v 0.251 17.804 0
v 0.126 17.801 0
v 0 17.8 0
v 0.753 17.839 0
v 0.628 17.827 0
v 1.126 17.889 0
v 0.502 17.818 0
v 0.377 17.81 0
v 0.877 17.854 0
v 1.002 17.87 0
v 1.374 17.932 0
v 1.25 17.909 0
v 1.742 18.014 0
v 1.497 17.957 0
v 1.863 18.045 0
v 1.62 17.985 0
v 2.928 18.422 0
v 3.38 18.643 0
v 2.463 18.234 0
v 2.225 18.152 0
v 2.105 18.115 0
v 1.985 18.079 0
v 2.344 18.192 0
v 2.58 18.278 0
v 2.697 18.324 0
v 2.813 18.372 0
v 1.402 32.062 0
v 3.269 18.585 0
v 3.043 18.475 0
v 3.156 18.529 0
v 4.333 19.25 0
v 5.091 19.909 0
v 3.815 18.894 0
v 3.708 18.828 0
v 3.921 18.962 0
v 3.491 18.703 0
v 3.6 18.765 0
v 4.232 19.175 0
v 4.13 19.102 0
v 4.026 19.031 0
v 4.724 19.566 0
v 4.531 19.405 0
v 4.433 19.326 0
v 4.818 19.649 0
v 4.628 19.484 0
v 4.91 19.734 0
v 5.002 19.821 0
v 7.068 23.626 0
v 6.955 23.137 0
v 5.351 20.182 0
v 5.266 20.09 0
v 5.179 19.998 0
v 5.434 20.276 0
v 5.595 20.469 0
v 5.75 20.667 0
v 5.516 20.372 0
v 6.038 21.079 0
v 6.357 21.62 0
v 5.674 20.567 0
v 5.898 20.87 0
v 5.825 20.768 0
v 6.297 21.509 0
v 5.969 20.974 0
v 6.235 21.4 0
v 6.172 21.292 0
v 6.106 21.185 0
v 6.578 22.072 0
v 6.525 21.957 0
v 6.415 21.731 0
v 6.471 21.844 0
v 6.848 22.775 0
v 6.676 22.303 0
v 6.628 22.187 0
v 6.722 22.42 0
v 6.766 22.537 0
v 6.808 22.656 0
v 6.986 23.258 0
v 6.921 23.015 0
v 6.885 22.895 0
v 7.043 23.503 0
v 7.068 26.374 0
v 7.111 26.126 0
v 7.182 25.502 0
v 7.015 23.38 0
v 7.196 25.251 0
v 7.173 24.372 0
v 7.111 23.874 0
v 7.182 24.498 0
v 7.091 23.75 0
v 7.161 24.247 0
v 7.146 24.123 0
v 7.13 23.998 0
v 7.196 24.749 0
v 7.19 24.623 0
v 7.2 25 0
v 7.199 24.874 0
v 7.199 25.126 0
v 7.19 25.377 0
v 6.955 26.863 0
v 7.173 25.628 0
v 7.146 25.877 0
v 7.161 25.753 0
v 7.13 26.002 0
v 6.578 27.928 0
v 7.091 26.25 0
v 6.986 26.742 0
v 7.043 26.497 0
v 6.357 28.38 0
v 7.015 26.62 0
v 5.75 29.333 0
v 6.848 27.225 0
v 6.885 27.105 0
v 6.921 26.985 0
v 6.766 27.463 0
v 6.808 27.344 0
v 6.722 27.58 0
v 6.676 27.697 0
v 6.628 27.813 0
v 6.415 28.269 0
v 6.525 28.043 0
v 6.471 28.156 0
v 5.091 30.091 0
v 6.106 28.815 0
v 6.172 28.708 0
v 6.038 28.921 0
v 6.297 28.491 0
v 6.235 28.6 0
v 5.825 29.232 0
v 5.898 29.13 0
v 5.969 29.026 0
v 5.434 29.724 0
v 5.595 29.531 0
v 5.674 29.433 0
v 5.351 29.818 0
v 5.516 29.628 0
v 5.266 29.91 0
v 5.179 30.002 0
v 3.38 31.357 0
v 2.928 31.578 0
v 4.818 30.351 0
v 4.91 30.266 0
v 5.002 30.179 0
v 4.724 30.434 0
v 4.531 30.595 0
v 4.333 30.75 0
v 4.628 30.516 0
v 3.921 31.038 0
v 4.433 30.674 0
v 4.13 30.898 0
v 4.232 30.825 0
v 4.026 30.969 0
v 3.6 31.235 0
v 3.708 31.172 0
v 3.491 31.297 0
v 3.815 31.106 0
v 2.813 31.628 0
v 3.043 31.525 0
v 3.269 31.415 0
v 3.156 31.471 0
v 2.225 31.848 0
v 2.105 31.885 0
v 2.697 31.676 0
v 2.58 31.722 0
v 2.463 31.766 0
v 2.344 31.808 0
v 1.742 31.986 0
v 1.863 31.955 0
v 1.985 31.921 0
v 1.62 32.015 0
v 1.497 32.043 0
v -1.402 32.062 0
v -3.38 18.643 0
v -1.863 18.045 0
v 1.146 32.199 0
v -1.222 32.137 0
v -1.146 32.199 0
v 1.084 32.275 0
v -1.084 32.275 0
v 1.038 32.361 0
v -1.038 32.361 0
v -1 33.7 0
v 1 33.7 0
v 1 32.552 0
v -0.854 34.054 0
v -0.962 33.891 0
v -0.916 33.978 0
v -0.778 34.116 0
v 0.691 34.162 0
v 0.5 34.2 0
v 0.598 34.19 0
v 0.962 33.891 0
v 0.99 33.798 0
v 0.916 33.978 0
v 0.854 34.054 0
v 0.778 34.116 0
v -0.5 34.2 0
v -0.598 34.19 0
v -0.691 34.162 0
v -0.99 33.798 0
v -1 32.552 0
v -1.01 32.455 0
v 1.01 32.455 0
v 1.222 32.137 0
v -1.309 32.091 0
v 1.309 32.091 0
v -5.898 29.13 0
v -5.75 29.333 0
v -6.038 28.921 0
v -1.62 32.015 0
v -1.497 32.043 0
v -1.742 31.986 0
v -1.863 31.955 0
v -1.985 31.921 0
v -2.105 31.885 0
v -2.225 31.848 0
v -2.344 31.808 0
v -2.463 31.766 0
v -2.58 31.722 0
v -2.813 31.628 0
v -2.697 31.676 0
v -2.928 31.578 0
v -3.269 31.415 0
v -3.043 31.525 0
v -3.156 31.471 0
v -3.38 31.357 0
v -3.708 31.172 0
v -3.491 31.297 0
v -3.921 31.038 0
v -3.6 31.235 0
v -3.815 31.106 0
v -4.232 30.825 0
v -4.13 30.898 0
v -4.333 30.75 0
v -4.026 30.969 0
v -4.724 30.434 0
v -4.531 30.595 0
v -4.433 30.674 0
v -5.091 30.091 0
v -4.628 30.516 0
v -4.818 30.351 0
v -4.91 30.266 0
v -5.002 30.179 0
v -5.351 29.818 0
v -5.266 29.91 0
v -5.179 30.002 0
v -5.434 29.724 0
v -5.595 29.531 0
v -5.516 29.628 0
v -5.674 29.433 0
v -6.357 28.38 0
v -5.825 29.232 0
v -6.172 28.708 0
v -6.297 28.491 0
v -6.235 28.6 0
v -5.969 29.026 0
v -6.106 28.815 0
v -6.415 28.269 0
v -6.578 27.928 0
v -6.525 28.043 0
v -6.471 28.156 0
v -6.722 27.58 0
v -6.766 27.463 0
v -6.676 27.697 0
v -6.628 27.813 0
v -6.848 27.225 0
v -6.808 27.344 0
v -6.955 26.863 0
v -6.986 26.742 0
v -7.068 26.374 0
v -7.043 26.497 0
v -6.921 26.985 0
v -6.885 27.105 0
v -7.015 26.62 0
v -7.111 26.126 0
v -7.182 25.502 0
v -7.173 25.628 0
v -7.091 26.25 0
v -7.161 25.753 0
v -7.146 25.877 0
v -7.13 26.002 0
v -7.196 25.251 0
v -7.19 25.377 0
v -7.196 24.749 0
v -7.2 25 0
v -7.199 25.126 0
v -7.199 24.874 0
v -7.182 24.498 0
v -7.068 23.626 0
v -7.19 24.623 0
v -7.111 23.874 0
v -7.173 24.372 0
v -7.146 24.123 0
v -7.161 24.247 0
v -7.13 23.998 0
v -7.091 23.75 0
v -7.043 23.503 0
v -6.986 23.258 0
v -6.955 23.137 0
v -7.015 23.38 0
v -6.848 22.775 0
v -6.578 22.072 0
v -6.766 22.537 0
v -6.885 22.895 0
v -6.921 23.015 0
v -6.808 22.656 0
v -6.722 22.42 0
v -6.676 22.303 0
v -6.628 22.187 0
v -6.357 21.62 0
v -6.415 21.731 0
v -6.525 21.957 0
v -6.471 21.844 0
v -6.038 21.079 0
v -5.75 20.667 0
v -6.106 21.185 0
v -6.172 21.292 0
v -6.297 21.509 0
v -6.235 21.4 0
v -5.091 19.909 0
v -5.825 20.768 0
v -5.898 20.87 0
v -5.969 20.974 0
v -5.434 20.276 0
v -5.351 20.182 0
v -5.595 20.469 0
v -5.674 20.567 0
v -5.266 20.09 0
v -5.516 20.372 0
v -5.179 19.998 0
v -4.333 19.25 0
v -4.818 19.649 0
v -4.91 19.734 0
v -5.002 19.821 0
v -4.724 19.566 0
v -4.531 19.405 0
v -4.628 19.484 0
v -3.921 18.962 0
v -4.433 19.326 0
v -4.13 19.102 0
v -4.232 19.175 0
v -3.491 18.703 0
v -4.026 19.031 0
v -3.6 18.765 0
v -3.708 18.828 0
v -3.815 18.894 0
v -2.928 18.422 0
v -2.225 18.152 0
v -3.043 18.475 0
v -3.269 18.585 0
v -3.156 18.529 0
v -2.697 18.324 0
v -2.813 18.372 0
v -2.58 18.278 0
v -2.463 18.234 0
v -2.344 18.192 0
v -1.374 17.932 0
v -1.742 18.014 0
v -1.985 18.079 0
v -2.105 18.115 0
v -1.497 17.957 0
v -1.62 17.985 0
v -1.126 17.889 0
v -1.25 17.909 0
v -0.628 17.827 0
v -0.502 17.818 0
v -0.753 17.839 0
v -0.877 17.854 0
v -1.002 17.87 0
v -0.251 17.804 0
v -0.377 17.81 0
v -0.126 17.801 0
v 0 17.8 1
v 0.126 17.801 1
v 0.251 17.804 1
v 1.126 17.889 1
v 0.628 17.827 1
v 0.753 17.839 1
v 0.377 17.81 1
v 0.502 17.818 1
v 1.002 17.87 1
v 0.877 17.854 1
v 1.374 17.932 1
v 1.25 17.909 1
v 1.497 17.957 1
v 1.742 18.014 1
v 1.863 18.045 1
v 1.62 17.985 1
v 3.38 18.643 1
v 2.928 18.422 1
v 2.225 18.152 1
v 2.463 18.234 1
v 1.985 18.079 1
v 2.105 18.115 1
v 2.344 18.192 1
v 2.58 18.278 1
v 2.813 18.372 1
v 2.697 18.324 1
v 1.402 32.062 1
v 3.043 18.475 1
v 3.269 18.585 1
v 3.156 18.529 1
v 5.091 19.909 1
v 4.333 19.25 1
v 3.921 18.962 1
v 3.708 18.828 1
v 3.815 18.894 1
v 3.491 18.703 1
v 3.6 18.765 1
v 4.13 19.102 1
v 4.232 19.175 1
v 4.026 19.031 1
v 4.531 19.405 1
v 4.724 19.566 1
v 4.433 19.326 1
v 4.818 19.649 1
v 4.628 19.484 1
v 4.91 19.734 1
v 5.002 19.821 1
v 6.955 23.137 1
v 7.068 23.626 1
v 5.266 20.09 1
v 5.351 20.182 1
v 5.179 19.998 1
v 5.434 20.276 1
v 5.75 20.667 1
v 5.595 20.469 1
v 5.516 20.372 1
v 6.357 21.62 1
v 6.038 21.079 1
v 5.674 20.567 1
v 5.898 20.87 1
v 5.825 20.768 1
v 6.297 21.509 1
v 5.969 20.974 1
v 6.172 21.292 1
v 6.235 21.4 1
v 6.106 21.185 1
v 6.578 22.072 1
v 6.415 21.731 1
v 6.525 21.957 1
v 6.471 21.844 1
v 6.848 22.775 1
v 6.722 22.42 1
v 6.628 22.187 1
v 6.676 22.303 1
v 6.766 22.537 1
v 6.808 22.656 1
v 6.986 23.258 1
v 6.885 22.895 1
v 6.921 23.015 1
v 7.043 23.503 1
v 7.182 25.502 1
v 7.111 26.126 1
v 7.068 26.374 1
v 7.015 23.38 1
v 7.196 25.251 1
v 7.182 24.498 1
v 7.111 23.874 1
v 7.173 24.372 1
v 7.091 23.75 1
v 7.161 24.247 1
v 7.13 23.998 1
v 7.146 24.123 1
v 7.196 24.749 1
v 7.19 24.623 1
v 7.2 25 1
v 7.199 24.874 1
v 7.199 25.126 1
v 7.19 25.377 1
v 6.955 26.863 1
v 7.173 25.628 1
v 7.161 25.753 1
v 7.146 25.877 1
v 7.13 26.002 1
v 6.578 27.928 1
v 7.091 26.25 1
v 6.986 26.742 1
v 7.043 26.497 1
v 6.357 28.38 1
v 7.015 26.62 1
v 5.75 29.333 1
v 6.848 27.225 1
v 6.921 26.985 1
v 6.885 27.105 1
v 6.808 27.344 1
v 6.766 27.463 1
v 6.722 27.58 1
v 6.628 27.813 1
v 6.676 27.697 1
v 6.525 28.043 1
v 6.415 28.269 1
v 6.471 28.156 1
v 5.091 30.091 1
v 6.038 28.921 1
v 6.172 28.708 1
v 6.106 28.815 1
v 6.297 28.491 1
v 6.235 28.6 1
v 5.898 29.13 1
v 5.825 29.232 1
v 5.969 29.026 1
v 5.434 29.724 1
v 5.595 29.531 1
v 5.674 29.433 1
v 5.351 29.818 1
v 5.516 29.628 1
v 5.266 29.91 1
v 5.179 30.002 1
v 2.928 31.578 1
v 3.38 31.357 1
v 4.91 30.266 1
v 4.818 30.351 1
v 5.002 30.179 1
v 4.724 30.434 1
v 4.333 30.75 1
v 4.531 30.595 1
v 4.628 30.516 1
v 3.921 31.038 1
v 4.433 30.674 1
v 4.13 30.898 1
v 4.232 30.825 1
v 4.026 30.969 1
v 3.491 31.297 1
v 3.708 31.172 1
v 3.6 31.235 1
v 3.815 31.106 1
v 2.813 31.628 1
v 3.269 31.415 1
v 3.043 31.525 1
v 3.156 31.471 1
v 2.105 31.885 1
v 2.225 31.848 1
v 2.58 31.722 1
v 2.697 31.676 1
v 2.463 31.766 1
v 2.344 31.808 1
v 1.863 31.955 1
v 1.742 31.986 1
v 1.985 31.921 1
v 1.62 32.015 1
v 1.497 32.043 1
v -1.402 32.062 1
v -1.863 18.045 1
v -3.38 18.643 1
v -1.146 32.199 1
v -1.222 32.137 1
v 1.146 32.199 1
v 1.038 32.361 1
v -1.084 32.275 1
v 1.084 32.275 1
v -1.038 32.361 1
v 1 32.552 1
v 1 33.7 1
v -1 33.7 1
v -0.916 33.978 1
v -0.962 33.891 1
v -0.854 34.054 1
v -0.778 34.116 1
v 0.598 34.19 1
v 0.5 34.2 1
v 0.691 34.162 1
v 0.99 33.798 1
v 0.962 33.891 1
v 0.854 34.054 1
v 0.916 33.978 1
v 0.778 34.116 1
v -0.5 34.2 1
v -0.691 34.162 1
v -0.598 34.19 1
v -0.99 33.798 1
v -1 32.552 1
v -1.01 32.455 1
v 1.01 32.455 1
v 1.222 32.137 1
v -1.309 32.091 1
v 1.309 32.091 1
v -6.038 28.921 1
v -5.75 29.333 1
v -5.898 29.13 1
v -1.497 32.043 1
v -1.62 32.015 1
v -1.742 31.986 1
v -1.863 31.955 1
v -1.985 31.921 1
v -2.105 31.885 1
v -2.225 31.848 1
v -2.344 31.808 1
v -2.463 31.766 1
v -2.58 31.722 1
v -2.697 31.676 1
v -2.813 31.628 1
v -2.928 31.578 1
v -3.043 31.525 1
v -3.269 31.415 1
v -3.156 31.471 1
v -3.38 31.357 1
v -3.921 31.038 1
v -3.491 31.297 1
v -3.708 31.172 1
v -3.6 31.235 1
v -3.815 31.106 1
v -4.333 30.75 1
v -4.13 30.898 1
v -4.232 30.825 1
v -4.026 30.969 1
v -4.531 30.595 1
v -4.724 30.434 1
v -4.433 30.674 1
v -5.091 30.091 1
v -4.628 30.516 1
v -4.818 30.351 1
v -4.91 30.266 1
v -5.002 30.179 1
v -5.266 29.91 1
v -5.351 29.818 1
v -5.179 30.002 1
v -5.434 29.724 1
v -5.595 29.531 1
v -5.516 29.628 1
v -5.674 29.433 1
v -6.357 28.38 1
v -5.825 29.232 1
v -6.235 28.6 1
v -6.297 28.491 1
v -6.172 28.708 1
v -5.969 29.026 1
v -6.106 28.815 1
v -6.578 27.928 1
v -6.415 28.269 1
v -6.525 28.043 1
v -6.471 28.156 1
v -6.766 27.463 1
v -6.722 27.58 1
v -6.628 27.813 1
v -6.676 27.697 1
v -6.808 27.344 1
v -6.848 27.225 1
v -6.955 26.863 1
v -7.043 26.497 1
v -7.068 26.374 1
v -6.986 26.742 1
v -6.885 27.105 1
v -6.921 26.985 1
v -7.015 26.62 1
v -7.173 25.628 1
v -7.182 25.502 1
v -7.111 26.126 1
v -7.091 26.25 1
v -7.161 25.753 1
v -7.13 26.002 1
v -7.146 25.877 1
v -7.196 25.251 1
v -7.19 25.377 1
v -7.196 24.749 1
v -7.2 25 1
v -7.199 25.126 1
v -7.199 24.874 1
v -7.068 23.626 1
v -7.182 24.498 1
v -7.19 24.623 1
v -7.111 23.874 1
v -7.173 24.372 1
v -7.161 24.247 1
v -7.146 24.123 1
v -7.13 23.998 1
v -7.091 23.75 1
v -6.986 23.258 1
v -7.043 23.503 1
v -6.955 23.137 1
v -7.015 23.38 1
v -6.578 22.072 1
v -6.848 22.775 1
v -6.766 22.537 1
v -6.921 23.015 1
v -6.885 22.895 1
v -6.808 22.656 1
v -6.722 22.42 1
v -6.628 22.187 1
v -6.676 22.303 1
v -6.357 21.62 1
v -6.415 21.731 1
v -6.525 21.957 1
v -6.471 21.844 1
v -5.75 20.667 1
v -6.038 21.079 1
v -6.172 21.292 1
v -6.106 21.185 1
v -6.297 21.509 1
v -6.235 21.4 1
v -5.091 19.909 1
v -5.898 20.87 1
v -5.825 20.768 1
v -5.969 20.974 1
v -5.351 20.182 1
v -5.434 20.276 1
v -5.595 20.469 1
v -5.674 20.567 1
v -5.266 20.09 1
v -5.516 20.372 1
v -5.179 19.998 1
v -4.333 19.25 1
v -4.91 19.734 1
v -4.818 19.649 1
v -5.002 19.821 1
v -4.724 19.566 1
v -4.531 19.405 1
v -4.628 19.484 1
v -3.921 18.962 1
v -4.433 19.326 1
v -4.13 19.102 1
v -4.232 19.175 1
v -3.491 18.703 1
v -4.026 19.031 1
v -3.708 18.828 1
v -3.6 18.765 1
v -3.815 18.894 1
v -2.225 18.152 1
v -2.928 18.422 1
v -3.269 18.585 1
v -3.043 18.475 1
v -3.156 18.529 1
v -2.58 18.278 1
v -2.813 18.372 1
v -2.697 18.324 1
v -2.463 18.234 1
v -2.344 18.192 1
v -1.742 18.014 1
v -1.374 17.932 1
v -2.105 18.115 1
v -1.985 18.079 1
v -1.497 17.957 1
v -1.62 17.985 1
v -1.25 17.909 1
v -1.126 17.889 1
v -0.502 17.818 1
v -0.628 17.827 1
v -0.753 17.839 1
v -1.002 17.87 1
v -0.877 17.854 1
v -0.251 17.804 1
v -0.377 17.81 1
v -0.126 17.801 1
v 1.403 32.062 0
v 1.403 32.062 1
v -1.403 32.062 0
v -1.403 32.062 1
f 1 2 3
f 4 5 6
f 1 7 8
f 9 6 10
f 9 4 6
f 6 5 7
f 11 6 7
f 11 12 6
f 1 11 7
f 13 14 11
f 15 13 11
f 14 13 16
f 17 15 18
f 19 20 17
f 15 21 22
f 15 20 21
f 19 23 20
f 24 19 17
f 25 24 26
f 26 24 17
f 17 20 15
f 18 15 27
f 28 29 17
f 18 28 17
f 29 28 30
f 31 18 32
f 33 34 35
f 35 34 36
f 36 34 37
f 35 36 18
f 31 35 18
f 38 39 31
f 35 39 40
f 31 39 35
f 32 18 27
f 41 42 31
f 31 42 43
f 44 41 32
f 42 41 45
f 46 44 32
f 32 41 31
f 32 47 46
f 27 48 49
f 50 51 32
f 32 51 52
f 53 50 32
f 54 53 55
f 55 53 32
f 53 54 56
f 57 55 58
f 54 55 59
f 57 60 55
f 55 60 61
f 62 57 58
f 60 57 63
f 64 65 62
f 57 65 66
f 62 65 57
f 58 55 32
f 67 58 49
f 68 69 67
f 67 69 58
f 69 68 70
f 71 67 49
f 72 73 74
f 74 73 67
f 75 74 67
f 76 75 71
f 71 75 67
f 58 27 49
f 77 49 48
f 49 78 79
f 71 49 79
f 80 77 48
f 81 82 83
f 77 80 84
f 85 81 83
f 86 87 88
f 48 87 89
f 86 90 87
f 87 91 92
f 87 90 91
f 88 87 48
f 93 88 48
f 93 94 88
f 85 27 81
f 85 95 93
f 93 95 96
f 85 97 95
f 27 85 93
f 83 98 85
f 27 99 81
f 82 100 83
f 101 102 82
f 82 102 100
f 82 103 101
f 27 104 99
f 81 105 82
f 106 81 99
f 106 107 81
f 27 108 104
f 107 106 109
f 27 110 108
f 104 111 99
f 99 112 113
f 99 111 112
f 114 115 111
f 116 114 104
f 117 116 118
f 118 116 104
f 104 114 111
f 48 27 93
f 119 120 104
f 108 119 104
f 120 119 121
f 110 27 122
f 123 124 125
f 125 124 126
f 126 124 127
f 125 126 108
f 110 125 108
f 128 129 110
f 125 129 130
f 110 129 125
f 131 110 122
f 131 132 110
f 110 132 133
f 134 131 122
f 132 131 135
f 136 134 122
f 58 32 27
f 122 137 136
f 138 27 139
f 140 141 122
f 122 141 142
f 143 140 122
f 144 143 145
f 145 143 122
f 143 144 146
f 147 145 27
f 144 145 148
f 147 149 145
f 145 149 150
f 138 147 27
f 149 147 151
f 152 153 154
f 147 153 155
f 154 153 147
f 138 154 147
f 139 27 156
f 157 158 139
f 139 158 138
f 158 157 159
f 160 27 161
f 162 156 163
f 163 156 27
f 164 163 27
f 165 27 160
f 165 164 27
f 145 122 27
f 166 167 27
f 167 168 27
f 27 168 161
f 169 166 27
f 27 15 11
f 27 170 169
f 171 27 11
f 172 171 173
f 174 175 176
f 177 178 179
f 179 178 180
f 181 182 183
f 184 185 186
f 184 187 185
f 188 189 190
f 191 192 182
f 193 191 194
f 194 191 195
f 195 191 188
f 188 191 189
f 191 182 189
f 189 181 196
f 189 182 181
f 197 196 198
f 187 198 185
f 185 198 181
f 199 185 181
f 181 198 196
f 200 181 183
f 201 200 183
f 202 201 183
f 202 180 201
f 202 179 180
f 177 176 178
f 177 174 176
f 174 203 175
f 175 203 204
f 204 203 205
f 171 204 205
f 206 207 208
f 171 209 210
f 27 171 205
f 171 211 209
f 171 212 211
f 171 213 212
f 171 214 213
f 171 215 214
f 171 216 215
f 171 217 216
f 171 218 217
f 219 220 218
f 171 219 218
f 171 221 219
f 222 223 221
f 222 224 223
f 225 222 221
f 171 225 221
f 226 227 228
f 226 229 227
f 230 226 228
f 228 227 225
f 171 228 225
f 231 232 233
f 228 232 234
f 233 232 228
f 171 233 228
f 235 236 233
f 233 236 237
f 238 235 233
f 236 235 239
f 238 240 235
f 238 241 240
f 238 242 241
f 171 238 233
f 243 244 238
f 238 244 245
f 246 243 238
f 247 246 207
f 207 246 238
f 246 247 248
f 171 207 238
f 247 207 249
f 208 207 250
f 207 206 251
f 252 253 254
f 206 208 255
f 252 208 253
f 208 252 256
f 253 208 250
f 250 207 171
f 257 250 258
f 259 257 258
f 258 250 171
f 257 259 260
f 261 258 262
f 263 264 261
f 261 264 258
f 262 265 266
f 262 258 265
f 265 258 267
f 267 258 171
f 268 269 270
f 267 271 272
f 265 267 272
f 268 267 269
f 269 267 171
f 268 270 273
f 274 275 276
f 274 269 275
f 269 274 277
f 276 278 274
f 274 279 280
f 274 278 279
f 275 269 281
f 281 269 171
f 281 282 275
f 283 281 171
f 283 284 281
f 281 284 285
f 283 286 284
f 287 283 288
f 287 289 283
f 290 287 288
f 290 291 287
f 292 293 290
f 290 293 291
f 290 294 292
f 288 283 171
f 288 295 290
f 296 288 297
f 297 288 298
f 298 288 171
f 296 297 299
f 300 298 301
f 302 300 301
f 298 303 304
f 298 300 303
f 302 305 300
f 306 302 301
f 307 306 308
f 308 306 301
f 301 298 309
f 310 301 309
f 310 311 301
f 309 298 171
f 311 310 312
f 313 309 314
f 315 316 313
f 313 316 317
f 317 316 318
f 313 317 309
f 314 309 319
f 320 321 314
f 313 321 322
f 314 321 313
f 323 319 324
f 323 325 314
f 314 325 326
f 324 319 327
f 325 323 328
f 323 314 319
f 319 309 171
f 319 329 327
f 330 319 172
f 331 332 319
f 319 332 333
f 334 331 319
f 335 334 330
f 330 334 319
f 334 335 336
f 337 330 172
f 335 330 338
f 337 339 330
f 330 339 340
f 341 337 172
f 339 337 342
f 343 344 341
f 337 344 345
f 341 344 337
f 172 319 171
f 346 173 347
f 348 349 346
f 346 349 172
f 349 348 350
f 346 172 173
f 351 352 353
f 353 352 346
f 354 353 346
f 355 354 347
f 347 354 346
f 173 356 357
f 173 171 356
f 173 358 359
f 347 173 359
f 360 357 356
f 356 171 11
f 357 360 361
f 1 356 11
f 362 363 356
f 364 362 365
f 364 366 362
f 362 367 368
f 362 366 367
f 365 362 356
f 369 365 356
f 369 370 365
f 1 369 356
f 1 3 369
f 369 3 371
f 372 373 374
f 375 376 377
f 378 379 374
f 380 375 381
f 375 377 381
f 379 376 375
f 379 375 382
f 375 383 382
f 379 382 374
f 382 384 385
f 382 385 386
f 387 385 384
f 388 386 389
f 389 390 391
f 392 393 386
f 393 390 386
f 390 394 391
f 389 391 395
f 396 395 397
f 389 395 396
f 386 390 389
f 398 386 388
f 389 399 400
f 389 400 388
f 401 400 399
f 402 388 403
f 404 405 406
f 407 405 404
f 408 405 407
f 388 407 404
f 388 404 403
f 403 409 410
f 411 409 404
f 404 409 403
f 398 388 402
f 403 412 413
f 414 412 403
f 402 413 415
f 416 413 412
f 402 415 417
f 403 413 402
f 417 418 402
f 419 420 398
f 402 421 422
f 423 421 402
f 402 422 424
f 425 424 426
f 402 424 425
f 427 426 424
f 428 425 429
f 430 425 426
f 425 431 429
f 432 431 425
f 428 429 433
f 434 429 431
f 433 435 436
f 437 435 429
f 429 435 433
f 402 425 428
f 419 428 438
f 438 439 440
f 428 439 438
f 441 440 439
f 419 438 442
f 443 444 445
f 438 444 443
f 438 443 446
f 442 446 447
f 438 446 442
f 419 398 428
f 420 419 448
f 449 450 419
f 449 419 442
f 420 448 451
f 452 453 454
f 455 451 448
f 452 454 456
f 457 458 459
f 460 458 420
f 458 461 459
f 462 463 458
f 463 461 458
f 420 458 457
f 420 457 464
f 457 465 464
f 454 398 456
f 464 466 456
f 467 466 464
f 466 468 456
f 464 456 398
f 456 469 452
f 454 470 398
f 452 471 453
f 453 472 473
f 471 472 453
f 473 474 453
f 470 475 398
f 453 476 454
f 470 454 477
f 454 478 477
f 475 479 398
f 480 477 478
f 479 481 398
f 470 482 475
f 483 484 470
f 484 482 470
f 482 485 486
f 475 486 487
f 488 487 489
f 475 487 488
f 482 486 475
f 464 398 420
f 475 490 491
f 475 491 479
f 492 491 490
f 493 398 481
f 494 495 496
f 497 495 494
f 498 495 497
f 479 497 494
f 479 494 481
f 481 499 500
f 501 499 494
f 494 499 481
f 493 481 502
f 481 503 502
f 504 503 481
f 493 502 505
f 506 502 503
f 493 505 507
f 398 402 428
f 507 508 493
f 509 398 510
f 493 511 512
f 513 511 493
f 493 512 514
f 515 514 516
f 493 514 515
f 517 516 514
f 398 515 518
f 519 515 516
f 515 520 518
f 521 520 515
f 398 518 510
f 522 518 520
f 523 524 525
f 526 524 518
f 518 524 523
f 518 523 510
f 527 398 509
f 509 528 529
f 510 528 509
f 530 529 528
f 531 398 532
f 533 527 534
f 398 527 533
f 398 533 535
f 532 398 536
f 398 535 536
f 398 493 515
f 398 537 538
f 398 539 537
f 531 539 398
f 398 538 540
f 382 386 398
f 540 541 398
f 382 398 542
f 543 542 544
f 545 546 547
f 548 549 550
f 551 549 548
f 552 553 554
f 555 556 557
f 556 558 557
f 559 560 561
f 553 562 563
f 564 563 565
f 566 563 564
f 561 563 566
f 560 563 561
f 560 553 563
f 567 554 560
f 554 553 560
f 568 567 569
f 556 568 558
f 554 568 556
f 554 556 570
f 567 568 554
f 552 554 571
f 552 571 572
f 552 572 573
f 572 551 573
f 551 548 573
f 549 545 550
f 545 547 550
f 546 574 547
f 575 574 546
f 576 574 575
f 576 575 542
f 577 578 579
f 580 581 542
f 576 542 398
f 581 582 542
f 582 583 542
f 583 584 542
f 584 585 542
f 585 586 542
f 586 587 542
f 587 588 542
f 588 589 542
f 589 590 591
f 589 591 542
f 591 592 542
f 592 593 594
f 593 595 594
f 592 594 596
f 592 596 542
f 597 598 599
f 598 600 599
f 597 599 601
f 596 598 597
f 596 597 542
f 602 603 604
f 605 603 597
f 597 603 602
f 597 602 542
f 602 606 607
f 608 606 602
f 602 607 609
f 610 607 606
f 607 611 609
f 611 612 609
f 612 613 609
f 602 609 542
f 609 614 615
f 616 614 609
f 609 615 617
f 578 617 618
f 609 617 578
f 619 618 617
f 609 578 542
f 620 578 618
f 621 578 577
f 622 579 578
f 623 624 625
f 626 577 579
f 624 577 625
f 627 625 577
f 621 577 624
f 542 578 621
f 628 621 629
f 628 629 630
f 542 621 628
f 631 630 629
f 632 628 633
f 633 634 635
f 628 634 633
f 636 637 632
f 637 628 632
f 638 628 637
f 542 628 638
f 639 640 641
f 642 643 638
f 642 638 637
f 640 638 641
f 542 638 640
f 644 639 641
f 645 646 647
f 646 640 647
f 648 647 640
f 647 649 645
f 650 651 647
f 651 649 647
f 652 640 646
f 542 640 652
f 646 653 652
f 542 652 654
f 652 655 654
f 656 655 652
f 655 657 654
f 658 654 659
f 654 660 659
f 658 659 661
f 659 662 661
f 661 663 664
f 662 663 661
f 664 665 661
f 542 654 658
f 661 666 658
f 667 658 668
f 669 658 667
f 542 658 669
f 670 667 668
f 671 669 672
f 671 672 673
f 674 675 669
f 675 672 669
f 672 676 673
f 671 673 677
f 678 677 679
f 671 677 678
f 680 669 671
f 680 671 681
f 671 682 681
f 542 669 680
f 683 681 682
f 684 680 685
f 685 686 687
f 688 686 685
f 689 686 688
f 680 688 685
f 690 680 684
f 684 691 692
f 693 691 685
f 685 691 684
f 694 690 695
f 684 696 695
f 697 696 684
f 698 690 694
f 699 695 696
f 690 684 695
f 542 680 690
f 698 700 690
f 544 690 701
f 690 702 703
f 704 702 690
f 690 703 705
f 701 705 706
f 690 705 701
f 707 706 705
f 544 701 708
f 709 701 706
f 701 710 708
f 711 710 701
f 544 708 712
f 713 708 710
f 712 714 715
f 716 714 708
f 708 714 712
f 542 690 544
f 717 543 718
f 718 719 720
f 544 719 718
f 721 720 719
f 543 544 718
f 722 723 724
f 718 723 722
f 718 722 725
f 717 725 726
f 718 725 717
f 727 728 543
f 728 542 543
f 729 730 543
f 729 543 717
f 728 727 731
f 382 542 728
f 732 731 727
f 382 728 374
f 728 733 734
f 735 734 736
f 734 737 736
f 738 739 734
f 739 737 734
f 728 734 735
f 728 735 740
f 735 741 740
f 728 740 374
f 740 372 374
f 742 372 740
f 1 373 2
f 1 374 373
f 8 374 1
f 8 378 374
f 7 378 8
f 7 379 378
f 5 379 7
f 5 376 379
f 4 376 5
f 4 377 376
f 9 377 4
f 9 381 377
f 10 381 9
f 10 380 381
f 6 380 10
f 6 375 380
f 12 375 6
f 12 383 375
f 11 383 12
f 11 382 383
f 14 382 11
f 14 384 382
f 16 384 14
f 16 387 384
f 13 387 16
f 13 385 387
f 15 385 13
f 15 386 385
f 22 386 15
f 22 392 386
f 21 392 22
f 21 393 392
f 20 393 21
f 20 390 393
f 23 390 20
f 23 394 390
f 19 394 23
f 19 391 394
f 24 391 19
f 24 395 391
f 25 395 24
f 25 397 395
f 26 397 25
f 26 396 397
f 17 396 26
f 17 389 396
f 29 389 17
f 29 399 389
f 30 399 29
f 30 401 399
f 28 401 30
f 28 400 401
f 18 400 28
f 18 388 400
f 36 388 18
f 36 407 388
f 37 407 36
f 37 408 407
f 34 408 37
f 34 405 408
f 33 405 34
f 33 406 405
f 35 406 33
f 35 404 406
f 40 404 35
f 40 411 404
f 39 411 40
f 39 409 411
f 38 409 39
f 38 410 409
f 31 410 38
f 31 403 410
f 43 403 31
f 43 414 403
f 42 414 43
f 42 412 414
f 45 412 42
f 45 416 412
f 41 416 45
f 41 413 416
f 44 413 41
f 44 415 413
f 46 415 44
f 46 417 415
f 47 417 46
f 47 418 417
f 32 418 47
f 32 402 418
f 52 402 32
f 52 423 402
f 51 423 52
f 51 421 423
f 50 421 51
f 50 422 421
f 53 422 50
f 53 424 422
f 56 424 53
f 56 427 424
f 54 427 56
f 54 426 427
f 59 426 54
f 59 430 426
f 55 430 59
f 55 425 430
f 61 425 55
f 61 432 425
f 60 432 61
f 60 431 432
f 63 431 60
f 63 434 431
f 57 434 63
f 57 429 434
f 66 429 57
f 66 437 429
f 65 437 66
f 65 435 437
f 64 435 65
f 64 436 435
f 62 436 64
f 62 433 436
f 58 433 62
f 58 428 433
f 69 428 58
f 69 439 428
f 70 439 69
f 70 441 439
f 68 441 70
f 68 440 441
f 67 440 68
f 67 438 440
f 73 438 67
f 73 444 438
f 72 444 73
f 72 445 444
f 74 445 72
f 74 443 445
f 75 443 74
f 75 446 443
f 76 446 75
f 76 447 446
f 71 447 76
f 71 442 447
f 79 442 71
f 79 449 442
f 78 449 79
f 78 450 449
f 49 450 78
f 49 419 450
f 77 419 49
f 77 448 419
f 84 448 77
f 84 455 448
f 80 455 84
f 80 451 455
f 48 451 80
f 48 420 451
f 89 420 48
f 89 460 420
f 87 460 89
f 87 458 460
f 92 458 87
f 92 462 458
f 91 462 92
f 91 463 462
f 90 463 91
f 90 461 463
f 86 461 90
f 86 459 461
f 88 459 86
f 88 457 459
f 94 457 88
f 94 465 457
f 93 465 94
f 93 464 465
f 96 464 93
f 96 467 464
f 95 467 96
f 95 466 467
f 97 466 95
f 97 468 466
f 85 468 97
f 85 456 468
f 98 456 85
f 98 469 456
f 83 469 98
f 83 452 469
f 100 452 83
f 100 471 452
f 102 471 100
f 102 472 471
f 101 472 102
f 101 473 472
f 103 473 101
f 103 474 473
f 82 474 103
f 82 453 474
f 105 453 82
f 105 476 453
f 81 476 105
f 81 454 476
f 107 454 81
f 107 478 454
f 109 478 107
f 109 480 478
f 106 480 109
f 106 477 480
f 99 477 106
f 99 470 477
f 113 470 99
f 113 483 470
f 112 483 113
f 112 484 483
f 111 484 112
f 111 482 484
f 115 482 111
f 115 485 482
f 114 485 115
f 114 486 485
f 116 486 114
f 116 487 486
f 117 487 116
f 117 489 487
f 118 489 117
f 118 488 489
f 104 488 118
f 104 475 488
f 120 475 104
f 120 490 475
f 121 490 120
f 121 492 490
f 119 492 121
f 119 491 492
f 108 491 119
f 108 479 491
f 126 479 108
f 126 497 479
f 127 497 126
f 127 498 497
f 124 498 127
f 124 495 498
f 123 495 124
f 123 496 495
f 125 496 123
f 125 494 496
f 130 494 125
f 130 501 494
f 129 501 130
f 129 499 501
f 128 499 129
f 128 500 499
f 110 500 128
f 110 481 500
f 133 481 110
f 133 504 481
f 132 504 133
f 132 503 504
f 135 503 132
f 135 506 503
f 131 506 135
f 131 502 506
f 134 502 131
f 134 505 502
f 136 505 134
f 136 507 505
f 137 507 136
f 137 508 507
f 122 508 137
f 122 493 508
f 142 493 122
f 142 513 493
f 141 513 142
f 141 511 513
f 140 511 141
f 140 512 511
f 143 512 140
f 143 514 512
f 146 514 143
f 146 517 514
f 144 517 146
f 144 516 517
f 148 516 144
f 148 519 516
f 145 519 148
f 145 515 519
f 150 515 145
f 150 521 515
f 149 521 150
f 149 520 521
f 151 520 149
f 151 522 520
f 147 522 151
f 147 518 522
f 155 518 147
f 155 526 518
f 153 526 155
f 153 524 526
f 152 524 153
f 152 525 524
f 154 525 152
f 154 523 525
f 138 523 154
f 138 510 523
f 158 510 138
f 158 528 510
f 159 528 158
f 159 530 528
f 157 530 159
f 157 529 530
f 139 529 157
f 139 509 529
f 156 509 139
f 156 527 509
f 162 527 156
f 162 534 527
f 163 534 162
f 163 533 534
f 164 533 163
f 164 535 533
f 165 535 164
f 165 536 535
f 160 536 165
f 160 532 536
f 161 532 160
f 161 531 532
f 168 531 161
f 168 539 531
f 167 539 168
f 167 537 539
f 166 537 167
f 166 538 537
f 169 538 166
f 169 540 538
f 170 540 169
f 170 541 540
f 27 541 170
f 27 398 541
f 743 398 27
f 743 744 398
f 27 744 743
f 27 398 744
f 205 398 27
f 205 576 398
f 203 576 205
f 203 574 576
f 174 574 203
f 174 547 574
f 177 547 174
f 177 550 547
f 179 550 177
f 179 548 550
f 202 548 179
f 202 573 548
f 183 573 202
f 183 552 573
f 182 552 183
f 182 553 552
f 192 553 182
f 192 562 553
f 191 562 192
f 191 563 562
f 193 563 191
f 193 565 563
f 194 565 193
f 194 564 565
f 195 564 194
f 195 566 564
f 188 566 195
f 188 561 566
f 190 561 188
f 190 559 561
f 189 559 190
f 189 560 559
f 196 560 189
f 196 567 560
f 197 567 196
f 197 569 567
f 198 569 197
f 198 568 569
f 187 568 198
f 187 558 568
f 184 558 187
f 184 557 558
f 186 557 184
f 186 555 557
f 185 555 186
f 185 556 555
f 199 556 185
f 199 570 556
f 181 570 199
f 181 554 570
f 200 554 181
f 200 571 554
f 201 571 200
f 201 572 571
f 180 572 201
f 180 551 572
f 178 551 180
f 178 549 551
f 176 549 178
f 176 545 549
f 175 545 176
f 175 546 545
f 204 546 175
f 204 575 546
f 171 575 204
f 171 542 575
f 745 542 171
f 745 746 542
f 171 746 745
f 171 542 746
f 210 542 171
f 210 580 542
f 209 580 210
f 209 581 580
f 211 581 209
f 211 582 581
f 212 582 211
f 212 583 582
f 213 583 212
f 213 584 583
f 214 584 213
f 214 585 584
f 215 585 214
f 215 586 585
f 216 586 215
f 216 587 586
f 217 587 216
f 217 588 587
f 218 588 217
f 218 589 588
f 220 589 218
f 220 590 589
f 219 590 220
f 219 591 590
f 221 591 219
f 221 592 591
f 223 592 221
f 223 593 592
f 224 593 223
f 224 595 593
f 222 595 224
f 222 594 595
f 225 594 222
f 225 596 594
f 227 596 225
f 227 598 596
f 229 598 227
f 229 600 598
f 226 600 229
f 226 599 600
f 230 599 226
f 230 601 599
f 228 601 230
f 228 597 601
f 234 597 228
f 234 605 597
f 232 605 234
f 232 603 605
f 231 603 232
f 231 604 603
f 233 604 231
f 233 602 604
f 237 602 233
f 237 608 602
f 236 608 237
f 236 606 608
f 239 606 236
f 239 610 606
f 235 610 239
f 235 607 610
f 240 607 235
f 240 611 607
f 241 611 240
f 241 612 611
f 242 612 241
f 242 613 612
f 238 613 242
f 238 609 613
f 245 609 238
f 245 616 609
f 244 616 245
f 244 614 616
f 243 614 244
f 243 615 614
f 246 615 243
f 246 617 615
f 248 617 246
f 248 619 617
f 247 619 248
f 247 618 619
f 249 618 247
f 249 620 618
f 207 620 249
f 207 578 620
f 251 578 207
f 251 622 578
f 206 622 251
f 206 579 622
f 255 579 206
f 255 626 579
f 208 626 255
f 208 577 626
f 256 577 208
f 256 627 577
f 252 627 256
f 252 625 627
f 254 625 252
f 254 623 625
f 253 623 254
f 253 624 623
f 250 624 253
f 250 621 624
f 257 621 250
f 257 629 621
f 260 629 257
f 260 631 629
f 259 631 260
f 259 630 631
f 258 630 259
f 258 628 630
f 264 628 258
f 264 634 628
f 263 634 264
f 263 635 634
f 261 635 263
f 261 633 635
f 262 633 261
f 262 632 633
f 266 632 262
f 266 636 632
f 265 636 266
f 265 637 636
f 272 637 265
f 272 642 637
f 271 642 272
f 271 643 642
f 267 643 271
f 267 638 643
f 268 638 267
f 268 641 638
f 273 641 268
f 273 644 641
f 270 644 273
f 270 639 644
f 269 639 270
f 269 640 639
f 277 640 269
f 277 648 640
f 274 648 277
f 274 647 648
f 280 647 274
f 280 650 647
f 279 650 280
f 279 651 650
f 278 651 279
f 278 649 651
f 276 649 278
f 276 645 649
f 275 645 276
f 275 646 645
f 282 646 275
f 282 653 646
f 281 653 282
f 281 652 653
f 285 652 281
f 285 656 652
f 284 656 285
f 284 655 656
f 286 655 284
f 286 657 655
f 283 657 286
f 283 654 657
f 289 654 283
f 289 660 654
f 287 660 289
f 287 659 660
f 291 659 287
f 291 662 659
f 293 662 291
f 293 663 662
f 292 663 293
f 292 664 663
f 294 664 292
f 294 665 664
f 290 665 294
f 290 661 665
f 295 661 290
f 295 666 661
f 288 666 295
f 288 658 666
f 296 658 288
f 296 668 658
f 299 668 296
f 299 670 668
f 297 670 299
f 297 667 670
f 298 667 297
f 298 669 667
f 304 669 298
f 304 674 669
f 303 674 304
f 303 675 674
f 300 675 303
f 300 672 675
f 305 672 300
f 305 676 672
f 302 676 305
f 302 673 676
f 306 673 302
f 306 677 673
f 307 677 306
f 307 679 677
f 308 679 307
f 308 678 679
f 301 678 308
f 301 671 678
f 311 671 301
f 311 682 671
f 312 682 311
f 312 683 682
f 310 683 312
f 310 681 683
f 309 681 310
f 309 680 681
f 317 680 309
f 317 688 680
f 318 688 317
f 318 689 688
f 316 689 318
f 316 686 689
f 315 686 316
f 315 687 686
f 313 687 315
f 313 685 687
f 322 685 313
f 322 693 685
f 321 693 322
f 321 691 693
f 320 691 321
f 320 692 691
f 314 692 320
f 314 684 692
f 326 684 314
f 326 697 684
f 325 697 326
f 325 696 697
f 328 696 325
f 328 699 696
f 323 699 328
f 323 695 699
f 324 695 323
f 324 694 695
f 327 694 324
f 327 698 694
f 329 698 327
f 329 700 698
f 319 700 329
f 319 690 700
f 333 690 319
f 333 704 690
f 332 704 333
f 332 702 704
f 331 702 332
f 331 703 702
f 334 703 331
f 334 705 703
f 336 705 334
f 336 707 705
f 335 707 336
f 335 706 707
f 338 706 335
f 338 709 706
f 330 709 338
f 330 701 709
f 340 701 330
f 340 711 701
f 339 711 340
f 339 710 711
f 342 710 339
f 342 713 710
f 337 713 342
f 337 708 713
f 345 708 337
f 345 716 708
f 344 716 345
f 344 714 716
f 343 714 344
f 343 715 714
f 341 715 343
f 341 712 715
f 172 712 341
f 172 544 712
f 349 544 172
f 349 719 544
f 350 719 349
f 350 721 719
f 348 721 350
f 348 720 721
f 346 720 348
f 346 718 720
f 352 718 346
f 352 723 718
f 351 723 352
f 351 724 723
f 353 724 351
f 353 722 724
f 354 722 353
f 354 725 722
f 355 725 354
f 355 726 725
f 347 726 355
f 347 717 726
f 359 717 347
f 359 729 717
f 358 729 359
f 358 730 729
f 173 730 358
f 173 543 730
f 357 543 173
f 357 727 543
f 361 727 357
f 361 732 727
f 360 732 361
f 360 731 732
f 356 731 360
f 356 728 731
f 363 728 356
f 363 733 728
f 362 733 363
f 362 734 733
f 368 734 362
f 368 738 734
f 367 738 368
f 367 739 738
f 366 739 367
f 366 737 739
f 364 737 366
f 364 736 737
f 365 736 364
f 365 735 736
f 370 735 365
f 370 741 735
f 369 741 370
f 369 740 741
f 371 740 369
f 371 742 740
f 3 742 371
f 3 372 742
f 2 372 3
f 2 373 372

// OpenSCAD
// file: ../scad/shape_modifier_utils.scad
// Overlap used to break coincident faces in booleans. Subtracting a cut that lands
// exactly on a surface leaves zero-thickness geometry, which renders unpredictably and
// slices worse; every cut is extended by this much so the faces genuinely cross.
//
// A function rather than a variable: `use <...>` exports functions but not top-level
// variable assignments, and the sweep reaches these files through `use`. Twelve modules
// across four files each declared their own `eps = 0.01` before this existed.
function geometry_eps() = 0.01;

// Length for a *centred* cutting solid that must pass entirely through material of
// depth `extent`. A centred cut reaches half this each way, so the factor leaves 50%
// clearance beyond `extent` on both sides -- a cut that lands flush on a face produces
// a zero-thickness shell rather than a clean hole.
//
// Measured against the swept parameter space: the deepest thing any of these cuts must
// clear is one bulkhead_section, one bulkhead_thickness tall, so the margin is 0.5 *
// bulkhead_thickness everywhere and scales with the part. Interconnect bulkheads stack
// two sections, but each section's cuts are applied before stacking, so the stack is
// not what a cut has to span.
function through_cut(extent) = 3 * extent;

// Distance at which to place a mask vertex so it lies outside anything within `extent`
// of the origin. Used by the half-plane polygons that trim an octant down to its
// wedge, where the vertex position only has to be "far enough" to be off the part.
//
// Worst case across 412 valid combinations is 3.25 mm of clearance, at U=0.5 with 1 mm
// panel: the shape reaches panel_offset + panel_overlap = 6.75 mm while the mask sits
// at 10 mm. Positive everywhere, and the gap widens with U.
function mask_reach(extent) = 2 * extent;


module octant_to_full() {
    mirror_x() {
        mirror_y() {
            mirror_xy() {
                children();
            }
        }
    }
}

module mirror_x() {
    union() {
        children();
        mirror([-1,0,0]) {
            children();
        }
    }
    
}

module mirror_y() {
    union() {
        children();
        mirror([0,-1,0]) {
            children();
        }
    }
    
}

module mirror_xy() {
    union() {
        children();
        mirror([1,-1,0]) {
            children();
        }
    }
}

module corner_translate(unit_width, corner_radius) {
    translate([unit_width/2-corner_radius,unit_width/2-corner_radius,0]) {
        children();
    }
}

// Move an octant out to its corner, then mirror it into all four -- the standard way
// a bulkhead profile is built from the one octant that is actually drawn.
//
// Every `*_shape` wrapper in fuselage_bulkhead_geometry.scad had this same pair open-
// coded around its own `*_octant` call. The wrappers stay: they name the full shape as
// distinct from the octant, and they are what seven call sites across two files use.
// It is the repeated body that is worth removing, not the interface.
module octant_tiled(unit_width, corner_radius) {
    octant_to_full() {
        corner_translate(unit_width, corner_radius) {
            children();
        }
    }
}


// mask lower diagonal quadrant
module octant_mask(unit_width, corner_radius) {
    eps = geometry_eps();
    polygon([[corner_radius+eps,corner_radius],
            [corner_radius+eps,-unit_width/2-corner_radius],
            [-unit_width/2-corner_radius+eps,-unit_width/2-corner_radius]]);
}

// fillet inward
module fillet_inner(radius) {
    intersection() {
        offset(r = -radius) {
            // fillet outward as well to ensure we round off any inward fillet artifacts (from input boundaries that are closer than 2*radius)
            offset(r = 2*radius) {
                offset(r = -radius) {
                    children();
                }
            }
        }
        // guarantee that the resultant shape has not gone outside the boundaries of the input shape
        children();
    }
}

// fillet outward
module fillet_outer(radius) {
    union() {
        offset(r = -radius) {
            offset(r = radius) {
                children();
            }
        }
        // guarantee that the resultant shape has not erroded into the boundaries of teh input shape
        children();
    }
}
// main file
// OQ-DES-B11: the key's direct fillet construction against the morphological one it replaces.
//
// `boom_key_shape` now builds its four corners as true fillets. The shape it replaced was
//
//     fillet_outer(r) { fillet_inner(r) { circle ∪ tab } }
//
// which is an opening (rounding the tab's two convex top corners) followed by a closing
// (filleting the two concave tab-to-collet junctions). The two forms should agree to
// tessellation, and the point of this file is to check that across the swept parameter space
// rather than at one size -- the same discipline ref_offset2d.scad exists to enforce.
//
// The morphological form is kept here, and only here, because it is the thing being measured
// against. It is not a second implementation: nothing includes this file.
//
// Extruded 1 mm, so every reported volume is an area. Modes 2 and 3 are the two halves of the
// symmetric difference, and both must be ~0 -- comparing total areas alone would let equal
// amounts of added and removed material cancel.
$fa=1;
$fs=0.1;

include <../scad/fuselage_boom_bulkhead_geometry.scad>

boom_diameter = 8.0;
boom_collet_thickness = 3.0;
boom_tolerance = 0.2;
boom_key_width = 2.0;
boom_key_height = 2.0;
boom_key_radius = 0.5;
boom_key_angle = 0.0;
boom_y_position = 0.0;
boom_z_position = 25.0;

mode = 0;

module key_direct() {
    boom_key_shape(boom_diameter, boom_y_position, boom_z_position, boom_collet_thickness,
                   boom_key_width, boom_key_height, boom_key_radius, boom_key_angle,
                   boom_tolerance);
}

// The historical morphological form, verbatim apart from indentation.
module key_morphological() {
    fillet_outer(boom_key_radius) {
        fillet_inner(boom_key_radius) {
            mirror_x() {
                translate([boom_y_position, boom_z_position]) {
                    rotate([0, 0, boom_key_angle]) {
                        union() {
                            circle(r = boom_diameter/2 + boom_collet_thickness + boom_tolerance);
                            translate([-boom_key_width/2, 0, 0]) {
                                square([boom_key_width,
                                        boom_diameter/2 + boom_collet_thickness
                                        + boom_tolerance + boom_key_height],
                                       center = false);
                            }
                        }
                    }
                }
            }
        }
    }
}

linear_extrude(height = 1) {
    if (mode == 0) {
        key_direct();
    } else if (mode == 1) {
        key_morphological();
    } else if (mode == 2) {
        // material the direct form adds
        difference() { key_direct(); key_morphological(); }
    } else if (mode == 3) {
        // material the direct form removes
        difference() { key_morphological(); key_direct(); }
    }
}
